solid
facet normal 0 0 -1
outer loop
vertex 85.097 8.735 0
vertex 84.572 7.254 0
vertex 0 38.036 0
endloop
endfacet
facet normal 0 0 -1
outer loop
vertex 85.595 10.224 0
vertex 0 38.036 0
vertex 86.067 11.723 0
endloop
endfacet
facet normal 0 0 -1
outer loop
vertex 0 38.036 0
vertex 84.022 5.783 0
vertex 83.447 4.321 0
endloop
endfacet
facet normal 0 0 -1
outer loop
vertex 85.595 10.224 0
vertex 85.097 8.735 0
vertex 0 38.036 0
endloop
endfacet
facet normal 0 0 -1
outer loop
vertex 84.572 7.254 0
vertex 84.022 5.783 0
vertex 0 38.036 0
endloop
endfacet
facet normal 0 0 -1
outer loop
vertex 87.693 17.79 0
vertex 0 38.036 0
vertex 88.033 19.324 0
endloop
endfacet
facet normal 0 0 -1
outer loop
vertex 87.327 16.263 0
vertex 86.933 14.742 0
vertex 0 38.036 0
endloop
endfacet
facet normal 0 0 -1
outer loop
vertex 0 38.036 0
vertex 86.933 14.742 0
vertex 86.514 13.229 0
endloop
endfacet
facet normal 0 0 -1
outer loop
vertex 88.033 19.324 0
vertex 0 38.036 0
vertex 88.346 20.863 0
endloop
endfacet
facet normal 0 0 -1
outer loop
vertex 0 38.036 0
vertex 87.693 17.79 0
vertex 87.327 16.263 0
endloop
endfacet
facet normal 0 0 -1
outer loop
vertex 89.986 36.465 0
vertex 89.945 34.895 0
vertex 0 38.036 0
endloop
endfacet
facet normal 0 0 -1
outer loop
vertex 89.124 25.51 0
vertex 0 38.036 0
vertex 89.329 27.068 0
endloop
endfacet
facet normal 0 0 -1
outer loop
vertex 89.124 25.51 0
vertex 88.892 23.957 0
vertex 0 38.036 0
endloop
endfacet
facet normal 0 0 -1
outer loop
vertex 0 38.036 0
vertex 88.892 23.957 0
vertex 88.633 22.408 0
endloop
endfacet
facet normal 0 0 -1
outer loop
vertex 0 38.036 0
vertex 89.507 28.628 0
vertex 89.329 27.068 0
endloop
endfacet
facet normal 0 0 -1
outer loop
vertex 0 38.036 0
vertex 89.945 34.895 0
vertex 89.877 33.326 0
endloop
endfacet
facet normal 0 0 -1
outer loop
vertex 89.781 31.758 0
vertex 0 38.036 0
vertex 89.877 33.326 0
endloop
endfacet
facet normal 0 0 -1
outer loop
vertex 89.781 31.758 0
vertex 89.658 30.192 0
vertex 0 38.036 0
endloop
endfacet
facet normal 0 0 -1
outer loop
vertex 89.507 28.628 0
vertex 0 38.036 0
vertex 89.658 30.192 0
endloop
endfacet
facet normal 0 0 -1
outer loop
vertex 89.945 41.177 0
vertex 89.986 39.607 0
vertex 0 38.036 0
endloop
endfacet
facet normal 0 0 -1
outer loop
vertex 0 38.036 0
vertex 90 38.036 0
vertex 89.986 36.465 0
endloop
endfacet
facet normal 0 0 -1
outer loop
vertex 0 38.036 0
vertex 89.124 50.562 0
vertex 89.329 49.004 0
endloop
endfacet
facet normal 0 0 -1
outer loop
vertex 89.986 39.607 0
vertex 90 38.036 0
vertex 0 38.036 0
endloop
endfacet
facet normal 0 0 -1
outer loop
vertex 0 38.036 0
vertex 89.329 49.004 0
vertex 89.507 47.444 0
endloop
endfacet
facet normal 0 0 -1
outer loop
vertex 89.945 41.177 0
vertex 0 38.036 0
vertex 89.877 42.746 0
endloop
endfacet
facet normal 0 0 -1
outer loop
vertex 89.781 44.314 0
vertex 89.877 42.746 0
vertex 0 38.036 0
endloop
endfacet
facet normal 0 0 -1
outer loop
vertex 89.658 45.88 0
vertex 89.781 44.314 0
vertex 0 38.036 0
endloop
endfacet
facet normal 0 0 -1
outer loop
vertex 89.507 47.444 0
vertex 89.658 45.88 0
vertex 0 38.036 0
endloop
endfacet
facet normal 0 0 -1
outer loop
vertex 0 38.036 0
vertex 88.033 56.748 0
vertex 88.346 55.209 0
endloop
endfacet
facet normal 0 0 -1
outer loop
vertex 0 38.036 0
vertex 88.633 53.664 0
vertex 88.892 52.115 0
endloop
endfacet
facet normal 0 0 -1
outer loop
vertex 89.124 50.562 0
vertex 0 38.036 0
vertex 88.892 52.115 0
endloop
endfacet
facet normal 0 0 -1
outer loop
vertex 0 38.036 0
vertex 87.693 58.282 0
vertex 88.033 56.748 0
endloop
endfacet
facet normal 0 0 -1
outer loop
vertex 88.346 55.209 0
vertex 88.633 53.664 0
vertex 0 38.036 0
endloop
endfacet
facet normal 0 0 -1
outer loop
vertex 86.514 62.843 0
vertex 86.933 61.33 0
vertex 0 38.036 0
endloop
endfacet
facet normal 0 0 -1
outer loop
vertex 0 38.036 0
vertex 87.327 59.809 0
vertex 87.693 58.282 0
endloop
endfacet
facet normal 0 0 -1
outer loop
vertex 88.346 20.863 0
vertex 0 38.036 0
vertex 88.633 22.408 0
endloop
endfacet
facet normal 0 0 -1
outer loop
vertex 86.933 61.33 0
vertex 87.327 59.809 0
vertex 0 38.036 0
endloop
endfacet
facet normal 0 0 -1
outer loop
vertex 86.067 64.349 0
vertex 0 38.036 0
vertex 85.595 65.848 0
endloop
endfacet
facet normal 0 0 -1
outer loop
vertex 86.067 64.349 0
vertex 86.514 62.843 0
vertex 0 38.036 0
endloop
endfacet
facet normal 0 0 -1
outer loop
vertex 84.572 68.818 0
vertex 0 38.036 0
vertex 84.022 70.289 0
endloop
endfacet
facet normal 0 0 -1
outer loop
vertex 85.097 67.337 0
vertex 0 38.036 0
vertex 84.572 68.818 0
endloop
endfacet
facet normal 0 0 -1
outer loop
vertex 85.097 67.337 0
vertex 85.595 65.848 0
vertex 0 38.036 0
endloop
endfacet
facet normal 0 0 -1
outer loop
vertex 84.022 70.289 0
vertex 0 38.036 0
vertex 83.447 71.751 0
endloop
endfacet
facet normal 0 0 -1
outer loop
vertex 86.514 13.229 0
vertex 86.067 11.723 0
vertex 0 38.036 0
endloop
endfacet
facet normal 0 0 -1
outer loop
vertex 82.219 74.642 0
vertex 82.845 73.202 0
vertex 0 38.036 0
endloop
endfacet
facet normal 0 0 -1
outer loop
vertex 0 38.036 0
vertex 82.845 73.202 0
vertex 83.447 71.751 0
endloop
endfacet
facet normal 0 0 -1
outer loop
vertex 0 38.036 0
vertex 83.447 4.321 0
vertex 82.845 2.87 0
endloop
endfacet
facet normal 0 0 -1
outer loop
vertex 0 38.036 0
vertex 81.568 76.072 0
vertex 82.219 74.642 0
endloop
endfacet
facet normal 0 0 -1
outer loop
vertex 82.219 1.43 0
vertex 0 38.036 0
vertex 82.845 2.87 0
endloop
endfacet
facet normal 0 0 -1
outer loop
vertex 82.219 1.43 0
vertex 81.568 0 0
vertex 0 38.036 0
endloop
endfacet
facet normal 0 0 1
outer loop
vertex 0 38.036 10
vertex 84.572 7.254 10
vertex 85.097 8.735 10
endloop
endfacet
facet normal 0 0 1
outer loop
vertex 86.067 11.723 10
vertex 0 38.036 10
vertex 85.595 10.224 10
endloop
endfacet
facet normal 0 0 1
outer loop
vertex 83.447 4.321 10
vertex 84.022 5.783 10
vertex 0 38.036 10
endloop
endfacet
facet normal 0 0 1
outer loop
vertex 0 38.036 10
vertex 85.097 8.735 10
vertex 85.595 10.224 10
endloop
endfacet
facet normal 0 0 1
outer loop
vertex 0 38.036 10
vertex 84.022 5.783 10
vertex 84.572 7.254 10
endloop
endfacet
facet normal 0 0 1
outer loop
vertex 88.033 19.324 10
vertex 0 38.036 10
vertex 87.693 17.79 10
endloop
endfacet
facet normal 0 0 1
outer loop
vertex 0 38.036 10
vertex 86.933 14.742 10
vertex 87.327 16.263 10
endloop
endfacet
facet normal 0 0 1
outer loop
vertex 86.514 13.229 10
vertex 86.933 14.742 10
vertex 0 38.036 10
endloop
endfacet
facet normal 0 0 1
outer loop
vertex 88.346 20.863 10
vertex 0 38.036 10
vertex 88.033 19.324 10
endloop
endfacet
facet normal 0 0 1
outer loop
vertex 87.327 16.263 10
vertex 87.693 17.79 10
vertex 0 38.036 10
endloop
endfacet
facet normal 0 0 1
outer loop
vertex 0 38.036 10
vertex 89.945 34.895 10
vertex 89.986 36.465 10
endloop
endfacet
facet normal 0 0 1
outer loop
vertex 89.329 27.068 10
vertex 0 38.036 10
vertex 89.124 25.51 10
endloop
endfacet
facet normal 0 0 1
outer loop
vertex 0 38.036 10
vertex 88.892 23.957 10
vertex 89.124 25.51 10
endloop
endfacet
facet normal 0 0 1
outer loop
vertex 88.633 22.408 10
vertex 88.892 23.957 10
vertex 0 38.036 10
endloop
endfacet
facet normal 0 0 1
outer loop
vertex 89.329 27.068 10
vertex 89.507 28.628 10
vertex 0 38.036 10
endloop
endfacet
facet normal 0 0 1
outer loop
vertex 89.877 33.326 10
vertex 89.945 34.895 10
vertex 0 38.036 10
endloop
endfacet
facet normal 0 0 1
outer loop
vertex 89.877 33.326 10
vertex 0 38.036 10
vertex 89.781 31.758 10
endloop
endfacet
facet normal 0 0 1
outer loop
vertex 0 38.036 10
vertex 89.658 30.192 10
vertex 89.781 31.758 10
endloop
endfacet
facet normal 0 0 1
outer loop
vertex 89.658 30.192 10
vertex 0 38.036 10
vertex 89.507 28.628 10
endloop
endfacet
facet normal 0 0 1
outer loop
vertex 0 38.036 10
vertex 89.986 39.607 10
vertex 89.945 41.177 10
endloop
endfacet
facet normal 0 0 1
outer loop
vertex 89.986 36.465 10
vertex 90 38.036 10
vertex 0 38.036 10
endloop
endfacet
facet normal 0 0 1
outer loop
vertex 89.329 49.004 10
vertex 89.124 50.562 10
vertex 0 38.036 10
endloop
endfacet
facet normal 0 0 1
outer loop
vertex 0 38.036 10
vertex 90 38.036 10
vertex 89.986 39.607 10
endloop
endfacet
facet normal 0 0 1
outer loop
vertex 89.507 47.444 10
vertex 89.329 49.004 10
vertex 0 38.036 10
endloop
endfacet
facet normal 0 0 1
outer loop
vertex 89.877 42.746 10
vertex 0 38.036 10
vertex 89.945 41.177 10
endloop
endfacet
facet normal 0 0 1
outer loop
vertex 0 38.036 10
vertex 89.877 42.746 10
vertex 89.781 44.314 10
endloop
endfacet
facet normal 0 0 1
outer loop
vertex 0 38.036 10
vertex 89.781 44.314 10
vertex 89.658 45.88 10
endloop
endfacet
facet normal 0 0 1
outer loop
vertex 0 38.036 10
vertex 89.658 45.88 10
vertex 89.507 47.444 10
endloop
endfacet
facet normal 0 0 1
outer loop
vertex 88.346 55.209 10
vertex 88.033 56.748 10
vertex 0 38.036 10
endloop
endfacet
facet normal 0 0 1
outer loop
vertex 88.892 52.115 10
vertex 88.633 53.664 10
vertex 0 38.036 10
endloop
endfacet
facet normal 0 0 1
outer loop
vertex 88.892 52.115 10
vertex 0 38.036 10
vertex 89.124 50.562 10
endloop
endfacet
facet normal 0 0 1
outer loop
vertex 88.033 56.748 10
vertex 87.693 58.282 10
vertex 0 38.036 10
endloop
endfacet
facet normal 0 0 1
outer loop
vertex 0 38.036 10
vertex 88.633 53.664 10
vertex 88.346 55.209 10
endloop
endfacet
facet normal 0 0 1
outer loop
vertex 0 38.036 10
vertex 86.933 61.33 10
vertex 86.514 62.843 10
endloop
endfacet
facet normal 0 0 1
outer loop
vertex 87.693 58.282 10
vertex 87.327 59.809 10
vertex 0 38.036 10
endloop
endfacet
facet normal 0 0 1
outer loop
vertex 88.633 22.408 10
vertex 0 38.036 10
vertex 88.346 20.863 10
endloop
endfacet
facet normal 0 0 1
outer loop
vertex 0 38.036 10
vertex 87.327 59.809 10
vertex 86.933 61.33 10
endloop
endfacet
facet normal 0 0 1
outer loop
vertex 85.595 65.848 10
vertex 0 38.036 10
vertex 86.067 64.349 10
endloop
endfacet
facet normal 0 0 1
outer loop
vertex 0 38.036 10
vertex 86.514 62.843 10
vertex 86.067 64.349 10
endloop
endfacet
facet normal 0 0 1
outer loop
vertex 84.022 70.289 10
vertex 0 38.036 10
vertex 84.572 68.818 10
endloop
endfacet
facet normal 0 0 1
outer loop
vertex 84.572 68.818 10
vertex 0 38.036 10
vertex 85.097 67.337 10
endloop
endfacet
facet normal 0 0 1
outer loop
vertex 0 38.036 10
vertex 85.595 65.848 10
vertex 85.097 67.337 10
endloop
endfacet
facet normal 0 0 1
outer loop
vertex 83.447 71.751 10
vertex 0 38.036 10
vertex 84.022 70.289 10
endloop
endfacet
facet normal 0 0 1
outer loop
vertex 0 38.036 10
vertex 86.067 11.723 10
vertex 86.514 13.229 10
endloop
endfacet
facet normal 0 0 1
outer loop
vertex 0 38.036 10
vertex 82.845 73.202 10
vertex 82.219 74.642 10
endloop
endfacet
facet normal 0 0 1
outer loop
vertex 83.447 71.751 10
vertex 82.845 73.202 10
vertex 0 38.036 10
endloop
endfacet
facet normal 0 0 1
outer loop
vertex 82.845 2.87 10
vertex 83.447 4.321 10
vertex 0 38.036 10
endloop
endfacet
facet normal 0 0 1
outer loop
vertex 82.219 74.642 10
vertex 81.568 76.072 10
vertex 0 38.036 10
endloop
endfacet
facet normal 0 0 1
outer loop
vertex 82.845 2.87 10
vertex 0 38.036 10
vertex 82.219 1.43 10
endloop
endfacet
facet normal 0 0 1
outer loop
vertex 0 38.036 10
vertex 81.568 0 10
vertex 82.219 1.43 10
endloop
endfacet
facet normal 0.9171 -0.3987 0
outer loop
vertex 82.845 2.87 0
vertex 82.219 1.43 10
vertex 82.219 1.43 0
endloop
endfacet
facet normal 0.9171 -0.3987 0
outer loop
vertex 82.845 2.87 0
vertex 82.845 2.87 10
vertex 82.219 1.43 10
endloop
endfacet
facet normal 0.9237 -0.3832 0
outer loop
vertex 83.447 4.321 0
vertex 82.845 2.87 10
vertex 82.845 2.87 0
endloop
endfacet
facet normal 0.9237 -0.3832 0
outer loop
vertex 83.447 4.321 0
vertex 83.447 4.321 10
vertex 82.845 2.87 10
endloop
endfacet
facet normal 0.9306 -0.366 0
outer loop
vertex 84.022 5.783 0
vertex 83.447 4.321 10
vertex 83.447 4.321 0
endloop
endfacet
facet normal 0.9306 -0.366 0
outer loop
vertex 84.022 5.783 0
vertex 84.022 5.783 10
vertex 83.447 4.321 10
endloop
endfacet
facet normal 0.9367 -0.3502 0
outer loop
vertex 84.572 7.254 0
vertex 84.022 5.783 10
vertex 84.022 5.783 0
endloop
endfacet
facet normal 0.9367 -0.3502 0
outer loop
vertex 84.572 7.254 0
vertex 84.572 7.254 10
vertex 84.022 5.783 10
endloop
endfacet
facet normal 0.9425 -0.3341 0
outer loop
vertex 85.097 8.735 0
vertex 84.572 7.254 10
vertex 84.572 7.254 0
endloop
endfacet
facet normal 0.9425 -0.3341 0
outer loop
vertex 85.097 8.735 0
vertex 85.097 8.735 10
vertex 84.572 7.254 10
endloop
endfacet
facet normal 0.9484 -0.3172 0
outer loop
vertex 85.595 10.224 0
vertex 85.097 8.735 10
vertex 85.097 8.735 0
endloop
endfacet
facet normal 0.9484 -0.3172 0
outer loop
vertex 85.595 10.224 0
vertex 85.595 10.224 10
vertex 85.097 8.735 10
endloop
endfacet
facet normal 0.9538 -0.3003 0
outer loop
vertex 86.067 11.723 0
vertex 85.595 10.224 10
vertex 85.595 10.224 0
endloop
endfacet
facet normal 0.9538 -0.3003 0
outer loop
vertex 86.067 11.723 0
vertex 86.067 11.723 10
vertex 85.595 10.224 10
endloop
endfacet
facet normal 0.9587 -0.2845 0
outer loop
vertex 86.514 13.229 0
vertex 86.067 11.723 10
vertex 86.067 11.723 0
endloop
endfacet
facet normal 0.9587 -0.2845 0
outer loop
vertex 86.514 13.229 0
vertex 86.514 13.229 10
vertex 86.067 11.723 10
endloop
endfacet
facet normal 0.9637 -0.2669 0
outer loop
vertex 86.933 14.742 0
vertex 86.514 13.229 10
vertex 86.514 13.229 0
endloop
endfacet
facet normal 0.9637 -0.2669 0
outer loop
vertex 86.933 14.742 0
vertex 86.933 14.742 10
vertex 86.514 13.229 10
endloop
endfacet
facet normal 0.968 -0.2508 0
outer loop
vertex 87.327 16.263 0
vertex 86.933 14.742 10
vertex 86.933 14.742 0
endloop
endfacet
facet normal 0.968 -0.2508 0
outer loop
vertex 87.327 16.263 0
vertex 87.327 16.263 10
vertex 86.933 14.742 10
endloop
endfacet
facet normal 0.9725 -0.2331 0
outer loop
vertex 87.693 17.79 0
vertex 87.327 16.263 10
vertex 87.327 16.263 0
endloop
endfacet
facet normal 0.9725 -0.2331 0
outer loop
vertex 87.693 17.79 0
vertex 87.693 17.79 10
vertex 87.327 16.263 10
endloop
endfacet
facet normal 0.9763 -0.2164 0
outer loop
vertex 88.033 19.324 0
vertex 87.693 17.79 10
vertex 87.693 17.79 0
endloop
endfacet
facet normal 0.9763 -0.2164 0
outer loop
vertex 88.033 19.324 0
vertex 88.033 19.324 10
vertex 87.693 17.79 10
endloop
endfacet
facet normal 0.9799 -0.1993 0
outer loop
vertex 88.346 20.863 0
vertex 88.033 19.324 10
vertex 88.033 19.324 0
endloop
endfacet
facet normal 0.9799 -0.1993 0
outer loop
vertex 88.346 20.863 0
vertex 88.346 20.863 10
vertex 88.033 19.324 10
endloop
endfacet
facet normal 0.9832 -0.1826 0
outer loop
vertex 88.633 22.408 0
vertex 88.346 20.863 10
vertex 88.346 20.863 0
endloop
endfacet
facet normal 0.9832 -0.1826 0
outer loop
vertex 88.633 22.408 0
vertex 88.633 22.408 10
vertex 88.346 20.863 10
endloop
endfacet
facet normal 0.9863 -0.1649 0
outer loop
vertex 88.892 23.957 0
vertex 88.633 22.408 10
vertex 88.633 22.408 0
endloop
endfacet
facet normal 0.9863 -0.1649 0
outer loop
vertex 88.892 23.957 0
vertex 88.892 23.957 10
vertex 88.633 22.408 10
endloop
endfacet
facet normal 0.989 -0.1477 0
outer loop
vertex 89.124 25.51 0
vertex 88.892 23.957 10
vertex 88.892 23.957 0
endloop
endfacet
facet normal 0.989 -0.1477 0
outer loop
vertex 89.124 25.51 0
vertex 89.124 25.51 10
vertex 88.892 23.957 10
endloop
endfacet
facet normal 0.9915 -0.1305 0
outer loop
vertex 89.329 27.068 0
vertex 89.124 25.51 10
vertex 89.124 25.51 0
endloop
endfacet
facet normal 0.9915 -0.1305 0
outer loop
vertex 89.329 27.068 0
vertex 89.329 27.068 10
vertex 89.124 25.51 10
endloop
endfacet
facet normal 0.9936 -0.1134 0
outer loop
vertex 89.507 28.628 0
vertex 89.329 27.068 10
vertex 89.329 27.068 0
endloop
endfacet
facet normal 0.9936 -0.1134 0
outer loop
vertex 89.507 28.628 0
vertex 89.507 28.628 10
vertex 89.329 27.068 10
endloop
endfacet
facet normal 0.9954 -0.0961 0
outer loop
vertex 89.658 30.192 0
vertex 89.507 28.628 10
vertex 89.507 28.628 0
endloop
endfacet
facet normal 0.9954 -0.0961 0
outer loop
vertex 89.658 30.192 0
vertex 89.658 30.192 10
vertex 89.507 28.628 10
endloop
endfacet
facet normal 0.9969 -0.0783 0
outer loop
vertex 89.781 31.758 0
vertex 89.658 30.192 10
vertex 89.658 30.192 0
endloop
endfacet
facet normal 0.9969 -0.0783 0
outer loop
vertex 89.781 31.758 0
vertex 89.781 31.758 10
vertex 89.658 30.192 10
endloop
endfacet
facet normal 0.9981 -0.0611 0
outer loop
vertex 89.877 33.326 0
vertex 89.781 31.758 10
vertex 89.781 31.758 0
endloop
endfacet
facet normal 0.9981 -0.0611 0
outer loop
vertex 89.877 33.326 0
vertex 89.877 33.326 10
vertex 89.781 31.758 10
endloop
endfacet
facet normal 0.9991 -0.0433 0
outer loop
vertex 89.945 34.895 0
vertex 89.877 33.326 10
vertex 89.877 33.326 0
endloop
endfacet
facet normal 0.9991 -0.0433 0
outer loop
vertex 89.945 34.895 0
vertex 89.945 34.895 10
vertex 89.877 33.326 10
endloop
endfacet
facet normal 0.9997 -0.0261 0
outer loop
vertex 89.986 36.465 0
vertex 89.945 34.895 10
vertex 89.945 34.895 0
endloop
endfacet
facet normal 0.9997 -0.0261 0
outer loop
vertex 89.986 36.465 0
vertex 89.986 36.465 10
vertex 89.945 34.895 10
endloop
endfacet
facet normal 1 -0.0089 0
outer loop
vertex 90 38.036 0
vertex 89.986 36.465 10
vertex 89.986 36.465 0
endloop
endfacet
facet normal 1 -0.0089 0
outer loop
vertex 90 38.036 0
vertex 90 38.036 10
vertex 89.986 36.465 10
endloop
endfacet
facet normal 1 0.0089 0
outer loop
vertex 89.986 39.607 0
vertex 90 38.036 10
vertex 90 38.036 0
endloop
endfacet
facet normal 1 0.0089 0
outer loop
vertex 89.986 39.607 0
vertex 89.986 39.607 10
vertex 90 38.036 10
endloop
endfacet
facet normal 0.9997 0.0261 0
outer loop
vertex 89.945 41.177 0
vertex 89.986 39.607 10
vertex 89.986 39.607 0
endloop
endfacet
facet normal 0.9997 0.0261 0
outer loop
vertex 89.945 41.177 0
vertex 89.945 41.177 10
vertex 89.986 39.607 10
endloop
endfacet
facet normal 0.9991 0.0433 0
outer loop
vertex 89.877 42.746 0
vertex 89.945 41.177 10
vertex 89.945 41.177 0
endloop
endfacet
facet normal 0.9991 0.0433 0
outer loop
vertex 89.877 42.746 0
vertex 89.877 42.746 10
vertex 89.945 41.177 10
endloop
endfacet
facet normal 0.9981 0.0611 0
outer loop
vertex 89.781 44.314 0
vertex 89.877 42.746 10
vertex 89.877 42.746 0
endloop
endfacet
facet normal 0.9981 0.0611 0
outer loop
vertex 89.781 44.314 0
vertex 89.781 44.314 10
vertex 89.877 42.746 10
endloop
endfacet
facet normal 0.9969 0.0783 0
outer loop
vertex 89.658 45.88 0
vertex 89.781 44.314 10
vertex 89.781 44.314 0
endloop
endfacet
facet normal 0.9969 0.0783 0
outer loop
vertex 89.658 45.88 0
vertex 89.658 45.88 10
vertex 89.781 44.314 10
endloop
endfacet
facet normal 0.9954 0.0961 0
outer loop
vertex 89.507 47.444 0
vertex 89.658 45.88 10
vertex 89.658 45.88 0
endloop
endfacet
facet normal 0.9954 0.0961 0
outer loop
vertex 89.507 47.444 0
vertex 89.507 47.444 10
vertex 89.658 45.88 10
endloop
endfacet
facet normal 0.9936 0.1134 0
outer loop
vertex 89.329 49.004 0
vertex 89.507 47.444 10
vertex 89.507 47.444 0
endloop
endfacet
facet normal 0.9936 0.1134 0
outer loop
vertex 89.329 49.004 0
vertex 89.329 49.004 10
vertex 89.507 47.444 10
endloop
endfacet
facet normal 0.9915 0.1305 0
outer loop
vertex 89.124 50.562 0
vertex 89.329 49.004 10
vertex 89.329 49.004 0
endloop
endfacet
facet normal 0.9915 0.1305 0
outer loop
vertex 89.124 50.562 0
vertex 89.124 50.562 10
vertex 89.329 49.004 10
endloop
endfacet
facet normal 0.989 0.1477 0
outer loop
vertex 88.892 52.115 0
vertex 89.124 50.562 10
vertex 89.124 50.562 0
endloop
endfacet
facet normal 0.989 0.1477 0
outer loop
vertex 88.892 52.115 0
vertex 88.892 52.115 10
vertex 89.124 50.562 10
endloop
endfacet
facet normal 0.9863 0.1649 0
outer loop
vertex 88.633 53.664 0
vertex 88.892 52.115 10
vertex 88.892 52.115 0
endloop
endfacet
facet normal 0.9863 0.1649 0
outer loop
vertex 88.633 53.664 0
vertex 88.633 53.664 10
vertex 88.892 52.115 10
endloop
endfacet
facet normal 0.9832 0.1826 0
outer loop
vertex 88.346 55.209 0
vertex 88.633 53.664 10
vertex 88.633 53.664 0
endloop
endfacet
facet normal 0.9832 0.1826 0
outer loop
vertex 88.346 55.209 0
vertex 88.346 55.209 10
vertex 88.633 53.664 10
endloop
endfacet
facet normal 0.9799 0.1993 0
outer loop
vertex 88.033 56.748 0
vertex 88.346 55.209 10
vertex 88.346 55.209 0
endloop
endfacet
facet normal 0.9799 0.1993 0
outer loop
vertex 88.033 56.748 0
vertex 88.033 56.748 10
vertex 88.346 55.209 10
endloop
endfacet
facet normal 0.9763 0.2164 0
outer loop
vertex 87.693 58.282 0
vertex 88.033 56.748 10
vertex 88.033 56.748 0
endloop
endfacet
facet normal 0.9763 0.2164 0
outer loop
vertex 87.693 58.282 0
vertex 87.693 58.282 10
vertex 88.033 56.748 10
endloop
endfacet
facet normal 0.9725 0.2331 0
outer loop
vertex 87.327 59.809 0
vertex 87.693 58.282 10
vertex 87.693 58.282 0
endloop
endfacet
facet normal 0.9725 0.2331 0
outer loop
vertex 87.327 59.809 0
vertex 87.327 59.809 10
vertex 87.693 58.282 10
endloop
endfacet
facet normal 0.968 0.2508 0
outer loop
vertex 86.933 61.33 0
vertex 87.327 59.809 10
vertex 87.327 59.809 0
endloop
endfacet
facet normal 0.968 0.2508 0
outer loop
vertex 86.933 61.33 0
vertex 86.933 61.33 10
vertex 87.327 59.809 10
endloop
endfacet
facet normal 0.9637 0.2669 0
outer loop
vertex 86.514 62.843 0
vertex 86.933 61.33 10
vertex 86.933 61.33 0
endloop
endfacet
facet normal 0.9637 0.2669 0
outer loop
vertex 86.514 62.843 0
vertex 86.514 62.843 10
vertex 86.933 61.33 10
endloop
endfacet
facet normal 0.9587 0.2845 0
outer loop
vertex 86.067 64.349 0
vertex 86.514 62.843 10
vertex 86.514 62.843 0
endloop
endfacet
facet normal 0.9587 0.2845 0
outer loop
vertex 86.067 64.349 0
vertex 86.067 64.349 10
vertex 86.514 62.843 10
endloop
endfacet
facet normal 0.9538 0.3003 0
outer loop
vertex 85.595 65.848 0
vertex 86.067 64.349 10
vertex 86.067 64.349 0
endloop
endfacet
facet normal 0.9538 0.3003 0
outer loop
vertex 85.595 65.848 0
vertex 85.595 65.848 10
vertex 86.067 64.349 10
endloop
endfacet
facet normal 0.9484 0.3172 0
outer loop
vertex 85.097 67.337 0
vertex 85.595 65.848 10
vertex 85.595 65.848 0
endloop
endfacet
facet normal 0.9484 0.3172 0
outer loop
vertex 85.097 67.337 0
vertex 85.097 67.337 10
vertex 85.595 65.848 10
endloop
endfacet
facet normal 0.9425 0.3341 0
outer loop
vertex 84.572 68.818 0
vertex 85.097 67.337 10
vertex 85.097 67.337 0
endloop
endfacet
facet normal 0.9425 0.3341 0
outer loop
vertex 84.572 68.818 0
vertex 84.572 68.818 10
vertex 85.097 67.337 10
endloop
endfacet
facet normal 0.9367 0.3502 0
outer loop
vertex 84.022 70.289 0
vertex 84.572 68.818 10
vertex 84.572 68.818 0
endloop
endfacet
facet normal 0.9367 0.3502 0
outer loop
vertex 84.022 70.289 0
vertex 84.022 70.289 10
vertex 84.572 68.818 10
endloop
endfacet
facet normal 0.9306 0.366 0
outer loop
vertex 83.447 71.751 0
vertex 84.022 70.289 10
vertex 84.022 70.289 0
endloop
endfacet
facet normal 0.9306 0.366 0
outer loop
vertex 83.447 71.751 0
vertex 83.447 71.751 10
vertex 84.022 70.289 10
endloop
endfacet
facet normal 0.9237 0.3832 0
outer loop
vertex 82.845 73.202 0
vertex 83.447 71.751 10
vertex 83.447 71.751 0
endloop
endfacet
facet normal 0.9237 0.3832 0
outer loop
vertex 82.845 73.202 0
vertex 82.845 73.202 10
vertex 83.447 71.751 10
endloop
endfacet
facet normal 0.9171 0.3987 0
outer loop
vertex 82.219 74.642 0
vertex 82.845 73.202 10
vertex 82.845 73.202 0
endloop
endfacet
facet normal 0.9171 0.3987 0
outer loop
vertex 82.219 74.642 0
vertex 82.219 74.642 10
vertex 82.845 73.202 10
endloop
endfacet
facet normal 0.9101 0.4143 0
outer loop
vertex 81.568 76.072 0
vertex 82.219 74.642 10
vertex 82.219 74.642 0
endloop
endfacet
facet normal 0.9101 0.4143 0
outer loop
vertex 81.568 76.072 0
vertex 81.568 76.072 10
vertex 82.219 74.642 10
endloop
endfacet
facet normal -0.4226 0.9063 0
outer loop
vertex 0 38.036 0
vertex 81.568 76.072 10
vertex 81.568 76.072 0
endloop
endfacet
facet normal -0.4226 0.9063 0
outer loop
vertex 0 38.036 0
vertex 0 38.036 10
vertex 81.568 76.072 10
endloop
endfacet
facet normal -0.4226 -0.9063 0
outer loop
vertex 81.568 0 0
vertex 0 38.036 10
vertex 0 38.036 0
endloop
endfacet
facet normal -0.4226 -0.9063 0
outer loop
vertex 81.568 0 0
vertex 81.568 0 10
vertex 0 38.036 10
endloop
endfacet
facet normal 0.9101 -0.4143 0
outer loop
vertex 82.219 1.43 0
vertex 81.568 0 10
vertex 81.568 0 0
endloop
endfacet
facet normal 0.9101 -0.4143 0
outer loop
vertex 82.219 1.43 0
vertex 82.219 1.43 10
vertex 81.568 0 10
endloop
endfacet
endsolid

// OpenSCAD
$fn = 32;

// ----------------------------------------------------------------------
// Arc profile plate: sector, 52 points
// ----------------------------------------------------------------------

// --- parameters (mm) ---
sector_angle = 50;        // sector angle, degrees
sector_r = 90;            // outer radius
arc_step = 1;             // sampling step of the arc, degrees
plate_t = 10;             // plate thickness, Z

bbox_x = 2 * sector_r * sin(sector_angle / 2);  // chord of the sector
bbox_y = sector_r;  // depth of the sector (apex to arc)

profile = [[81.568, 0], [82.219, 1.43], [82.845, 2.87], [83.447, 4.321], [84.022, 5.783], [84.572, 7.254], [85.097, 8.735], [85.595, 10.224], [86.067, 11.723], [86.514, 13.229], [86.933, 14.742], [87.327, 16.263], [87.693, 17.79], [88.033, 19.324], [88.346, 20.863], [88.633, 22.408], [88.892, 23.957], [89.124, 25.51], [89.329, 27.068], [89.507, 28.628], [89.658, 30.192], [89.781, 31.758], [89.877, 33.326], [89.945, 34.895], [89.986, 36.465], [90, 38.036], [89.986, 39.607], [89.945, 41.177], [89.877, 42.746], [89.781, 44.314], [89.658, 45.88], [89.507, 47.444], [89.329, 49.004], [89.124, 50.562], [88.892, 52.115], [88.633, 53.664], [88.346, 55.209], [88.033, 56.748], [87.693, 58.282], [87.327, 59.809], [86.933, 61.33], [86.514, 62.843], [86.067, 64.349], [85.595, 65.848], [85.097, 67.337], [84.572, 68.818], [84.022, 70.289], [83.447, 71.751], [82.845, 73.202], [82.219, 74.642], [81.568, 76.072], [0, 38.036]];  // primary outline, 52 points, counter clockwise

// --- the one profile operation ---
linear_extrude(height = plate_t) polygon(points = profile);
